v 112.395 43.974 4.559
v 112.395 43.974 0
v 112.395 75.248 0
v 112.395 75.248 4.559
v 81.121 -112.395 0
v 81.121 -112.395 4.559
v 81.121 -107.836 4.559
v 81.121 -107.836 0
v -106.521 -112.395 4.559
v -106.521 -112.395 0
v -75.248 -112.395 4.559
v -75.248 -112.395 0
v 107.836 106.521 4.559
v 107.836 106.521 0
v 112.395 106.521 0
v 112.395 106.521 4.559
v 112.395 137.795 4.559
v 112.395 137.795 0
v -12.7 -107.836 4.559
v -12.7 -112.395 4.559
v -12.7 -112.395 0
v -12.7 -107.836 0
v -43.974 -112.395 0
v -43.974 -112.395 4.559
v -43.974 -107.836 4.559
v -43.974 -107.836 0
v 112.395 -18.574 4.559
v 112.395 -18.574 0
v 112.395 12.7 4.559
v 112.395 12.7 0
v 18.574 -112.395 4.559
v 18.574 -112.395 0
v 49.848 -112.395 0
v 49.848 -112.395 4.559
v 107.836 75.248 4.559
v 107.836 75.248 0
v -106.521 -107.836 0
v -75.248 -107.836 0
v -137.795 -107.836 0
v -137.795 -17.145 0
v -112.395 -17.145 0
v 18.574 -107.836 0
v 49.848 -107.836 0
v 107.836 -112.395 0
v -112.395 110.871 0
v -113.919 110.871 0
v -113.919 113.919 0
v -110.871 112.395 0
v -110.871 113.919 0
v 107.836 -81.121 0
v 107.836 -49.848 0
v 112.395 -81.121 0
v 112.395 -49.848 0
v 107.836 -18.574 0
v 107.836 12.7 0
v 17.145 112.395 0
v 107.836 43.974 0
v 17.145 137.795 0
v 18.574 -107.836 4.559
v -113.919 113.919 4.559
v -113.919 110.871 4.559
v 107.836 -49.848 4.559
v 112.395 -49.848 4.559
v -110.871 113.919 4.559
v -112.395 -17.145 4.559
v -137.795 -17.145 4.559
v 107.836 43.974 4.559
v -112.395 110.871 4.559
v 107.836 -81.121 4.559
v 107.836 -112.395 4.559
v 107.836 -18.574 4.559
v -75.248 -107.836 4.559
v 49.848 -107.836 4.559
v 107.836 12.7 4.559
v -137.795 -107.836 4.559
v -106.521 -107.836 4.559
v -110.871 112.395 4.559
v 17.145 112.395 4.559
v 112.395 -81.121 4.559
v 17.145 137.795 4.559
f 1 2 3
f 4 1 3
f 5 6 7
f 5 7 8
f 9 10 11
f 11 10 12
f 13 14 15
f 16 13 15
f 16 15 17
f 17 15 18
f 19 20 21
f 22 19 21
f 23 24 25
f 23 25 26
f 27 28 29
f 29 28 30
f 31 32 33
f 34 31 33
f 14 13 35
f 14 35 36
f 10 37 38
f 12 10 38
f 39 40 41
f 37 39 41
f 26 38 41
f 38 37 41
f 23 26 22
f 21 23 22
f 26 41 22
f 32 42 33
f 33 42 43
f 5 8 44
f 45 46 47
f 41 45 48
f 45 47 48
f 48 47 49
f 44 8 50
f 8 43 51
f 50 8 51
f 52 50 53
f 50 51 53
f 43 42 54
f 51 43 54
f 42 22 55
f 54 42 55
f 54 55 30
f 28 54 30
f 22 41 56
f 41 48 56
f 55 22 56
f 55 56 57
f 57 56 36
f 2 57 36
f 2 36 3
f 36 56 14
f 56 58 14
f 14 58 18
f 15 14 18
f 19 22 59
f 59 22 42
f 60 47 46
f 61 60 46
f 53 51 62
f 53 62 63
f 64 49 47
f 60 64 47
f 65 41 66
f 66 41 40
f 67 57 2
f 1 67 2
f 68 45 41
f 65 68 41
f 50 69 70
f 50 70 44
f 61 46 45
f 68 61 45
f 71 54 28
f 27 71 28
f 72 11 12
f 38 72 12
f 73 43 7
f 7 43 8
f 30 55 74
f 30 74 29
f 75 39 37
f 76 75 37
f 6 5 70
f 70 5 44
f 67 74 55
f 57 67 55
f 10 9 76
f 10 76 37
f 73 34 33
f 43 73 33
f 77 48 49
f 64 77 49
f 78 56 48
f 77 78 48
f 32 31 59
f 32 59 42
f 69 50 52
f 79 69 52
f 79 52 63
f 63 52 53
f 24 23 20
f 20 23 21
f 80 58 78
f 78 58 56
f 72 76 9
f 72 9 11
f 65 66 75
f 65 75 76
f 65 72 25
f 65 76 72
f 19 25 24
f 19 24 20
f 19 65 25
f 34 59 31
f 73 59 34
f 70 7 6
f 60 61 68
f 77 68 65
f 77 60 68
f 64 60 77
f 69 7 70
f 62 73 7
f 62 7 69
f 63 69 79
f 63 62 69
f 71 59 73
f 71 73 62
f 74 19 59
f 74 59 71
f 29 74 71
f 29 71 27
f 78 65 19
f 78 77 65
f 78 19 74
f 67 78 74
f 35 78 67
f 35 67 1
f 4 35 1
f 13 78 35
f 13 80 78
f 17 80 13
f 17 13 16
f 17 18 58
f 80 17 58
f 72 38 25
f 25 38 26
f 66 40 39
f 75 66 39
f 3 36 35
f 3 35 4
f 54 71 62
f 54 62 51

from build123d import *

# Parameters (mm, degrees)
BOSS_EXTRUDE1_DEPTH = 4.5593
CAVITY1_START       = -112.395
CAVITY1_OUTLINE_W   = 4.5593
CAVITY1_OUTLINE_H   = 4.5593
CAVITY1_OUTLINE_W_2 = 31.27375
CAVITY1_DEPTH       = 4.5593
CAVITY1_START_2     = -49.8475
CAVITY1_2_OUTLINE_W = 4.5593
CAVITY1_2_OUTLINE_H = 4.5593
CAVITY1_2_DEPTH     = 31.27375
CAVITY1_START_3     = 12.7
CAVITY1_3_OUTLINE_W = 4.5593
CAVITY1_3_OUTLINE_H = 4.5593
CAVITY1_3_DEPTH     = 31.27375
CAVITY1_START_4     = 75.2475
CAVITY1_4_OUTLINE_W = 4.5593
CAVITY1_4_OUTLINE_H = 4.5593
CAVITY1_4_DEPTH     = 31.27375
CAVITY1_START_5     = -107.8357
CAVITY1_5_OUTLINE_W = 4.5593
CAVITY1_5_OUTLINE_H = 4.5593
CAVITY1_5_DEPTH     = 26.71445


# Read off the part's stored shape, not the designer's step: Cavity1
with BuildPart() as part:
    # Sketch1 → Boss-Extrude1 (new body)
    with BuildSketch(Plane.XY):
        Polygon((-112.395, -17.145), (-137.795, -17.145), (-137.795, -112.395), (112.395, -112.395), (112.395, 112.395), (112.395, 137.795), (17.145, 137.795), (17.145, 112.395), (-110.871, 112.395), (-110.871, 113.919), (-113.919, 113.919), (-113.919, 110.871), (-112.395, 110.871), align=None)
    extrude(amount=BOSS_EXTRUDE1_DEPTH)

    # Cavity1 outline → Cavity1 (cut)
    with BuildSketch(Plane(origin=(0, 0, 0), x_dir=(1, 0, 0), z_dir=(0, 1, 0)).offset(CAVITY1_START)):
        with Locations((110.11535, -2.27965)):
            Rectangle(CAVITY1_OUTLINE_W, CAVITY1_OUTLINE_H)
        with Locations((65.484375, -2.27965)):
            Rectangle(CAVITY1_OUTLINE_W_2, CAVITY1_OUTLINE_H)
        with Locations((2.936875, -2.27965)):
            Rectangle(CAVITY1_OUTLINE_W_2, CAVITY1_OUTLINE_H)
        with Locations((-59.610625, -2.27965)):
            Rectangle(CAVITY1_OUTLINE_W_2, CAVITY1_OUTLINE_H)
        with Locations((-122.158125, -2.27965)):
            Rectangle(CAVITY1_OUTLINE_W_2, CAVITY1_OUTLINE_H)
    extrude(amount=CAVITY1_DEPTH, mode=Mode.SUBTRACT)

    # Cavity1 2 outline → Cavity1 2 (cut)
    with BuildSketch(Plane(origin=(0, 0, 0), x_dir=(1, 0, 0), z_dir=(0, 1, 0)).offset(CAVITY1_START_2)):
        with Locations((110.11535, -2.27965)):
            Rectangle(CAVITY1_2_OUTLINE_W, CAVITY1_2_OUTLINE_H)
    extrude(amount=CAVITY1_2_DEPTH, mode=Mode.SUBTRACT)

    # Cavity1 3 outline → Cavity1 3 (cut)
    with BuildSketch(Plane(origin=(0, 0, 0), x_dir=(1, 0, 0), z_dir=(0, 1, 0)).offset(CAVITY1_START_3)):
        with Locations((110.11535, -2.27965)):
            Rectangle(CAVITY1_3_OUTLINE_W, CAVITY1_3_OUTLINE_H)
    extrude(amount=CAVITY1_3_DEPTH, mode=Mode.SUBTRACT)

    # Cavity1 4 outline → Cavity1 4 (cut)
    with BuildSketch(Plane(origin=(0, 0, 0), x_dir=(1, 0, 0), z_dir=(0, 1, 0)).offset(CAVITY1_START_4)):
        with Locations((110.11535, -2.27965)):
            Rectangle(CAVITY1_4_OUTLINE_W, CAVITY1_4_OUTLINE_H)
    extrude(amount=CAVITY1_4_DEPTH, mode=Mode.SUBTRACT)

    # Cavity1 5 outline → Cavity1 5 (cut)
    with BuildSketch(Plane(origin=(0, 0, 0), x_dir=(1, 0, 0), z_dir=(0, 1, 0)).offset(CAVITY1_START_5)):
        with Locations((110.11535, -2.27965)):
            Rectangle(CAVITY1_5_OUTLINE_W, CAVITY1_5_OUTLINE_H)
    extrude(amount=CAVITY1_5_DEPTH, mode=Mode.SUBTRACT)


solid = part.part
